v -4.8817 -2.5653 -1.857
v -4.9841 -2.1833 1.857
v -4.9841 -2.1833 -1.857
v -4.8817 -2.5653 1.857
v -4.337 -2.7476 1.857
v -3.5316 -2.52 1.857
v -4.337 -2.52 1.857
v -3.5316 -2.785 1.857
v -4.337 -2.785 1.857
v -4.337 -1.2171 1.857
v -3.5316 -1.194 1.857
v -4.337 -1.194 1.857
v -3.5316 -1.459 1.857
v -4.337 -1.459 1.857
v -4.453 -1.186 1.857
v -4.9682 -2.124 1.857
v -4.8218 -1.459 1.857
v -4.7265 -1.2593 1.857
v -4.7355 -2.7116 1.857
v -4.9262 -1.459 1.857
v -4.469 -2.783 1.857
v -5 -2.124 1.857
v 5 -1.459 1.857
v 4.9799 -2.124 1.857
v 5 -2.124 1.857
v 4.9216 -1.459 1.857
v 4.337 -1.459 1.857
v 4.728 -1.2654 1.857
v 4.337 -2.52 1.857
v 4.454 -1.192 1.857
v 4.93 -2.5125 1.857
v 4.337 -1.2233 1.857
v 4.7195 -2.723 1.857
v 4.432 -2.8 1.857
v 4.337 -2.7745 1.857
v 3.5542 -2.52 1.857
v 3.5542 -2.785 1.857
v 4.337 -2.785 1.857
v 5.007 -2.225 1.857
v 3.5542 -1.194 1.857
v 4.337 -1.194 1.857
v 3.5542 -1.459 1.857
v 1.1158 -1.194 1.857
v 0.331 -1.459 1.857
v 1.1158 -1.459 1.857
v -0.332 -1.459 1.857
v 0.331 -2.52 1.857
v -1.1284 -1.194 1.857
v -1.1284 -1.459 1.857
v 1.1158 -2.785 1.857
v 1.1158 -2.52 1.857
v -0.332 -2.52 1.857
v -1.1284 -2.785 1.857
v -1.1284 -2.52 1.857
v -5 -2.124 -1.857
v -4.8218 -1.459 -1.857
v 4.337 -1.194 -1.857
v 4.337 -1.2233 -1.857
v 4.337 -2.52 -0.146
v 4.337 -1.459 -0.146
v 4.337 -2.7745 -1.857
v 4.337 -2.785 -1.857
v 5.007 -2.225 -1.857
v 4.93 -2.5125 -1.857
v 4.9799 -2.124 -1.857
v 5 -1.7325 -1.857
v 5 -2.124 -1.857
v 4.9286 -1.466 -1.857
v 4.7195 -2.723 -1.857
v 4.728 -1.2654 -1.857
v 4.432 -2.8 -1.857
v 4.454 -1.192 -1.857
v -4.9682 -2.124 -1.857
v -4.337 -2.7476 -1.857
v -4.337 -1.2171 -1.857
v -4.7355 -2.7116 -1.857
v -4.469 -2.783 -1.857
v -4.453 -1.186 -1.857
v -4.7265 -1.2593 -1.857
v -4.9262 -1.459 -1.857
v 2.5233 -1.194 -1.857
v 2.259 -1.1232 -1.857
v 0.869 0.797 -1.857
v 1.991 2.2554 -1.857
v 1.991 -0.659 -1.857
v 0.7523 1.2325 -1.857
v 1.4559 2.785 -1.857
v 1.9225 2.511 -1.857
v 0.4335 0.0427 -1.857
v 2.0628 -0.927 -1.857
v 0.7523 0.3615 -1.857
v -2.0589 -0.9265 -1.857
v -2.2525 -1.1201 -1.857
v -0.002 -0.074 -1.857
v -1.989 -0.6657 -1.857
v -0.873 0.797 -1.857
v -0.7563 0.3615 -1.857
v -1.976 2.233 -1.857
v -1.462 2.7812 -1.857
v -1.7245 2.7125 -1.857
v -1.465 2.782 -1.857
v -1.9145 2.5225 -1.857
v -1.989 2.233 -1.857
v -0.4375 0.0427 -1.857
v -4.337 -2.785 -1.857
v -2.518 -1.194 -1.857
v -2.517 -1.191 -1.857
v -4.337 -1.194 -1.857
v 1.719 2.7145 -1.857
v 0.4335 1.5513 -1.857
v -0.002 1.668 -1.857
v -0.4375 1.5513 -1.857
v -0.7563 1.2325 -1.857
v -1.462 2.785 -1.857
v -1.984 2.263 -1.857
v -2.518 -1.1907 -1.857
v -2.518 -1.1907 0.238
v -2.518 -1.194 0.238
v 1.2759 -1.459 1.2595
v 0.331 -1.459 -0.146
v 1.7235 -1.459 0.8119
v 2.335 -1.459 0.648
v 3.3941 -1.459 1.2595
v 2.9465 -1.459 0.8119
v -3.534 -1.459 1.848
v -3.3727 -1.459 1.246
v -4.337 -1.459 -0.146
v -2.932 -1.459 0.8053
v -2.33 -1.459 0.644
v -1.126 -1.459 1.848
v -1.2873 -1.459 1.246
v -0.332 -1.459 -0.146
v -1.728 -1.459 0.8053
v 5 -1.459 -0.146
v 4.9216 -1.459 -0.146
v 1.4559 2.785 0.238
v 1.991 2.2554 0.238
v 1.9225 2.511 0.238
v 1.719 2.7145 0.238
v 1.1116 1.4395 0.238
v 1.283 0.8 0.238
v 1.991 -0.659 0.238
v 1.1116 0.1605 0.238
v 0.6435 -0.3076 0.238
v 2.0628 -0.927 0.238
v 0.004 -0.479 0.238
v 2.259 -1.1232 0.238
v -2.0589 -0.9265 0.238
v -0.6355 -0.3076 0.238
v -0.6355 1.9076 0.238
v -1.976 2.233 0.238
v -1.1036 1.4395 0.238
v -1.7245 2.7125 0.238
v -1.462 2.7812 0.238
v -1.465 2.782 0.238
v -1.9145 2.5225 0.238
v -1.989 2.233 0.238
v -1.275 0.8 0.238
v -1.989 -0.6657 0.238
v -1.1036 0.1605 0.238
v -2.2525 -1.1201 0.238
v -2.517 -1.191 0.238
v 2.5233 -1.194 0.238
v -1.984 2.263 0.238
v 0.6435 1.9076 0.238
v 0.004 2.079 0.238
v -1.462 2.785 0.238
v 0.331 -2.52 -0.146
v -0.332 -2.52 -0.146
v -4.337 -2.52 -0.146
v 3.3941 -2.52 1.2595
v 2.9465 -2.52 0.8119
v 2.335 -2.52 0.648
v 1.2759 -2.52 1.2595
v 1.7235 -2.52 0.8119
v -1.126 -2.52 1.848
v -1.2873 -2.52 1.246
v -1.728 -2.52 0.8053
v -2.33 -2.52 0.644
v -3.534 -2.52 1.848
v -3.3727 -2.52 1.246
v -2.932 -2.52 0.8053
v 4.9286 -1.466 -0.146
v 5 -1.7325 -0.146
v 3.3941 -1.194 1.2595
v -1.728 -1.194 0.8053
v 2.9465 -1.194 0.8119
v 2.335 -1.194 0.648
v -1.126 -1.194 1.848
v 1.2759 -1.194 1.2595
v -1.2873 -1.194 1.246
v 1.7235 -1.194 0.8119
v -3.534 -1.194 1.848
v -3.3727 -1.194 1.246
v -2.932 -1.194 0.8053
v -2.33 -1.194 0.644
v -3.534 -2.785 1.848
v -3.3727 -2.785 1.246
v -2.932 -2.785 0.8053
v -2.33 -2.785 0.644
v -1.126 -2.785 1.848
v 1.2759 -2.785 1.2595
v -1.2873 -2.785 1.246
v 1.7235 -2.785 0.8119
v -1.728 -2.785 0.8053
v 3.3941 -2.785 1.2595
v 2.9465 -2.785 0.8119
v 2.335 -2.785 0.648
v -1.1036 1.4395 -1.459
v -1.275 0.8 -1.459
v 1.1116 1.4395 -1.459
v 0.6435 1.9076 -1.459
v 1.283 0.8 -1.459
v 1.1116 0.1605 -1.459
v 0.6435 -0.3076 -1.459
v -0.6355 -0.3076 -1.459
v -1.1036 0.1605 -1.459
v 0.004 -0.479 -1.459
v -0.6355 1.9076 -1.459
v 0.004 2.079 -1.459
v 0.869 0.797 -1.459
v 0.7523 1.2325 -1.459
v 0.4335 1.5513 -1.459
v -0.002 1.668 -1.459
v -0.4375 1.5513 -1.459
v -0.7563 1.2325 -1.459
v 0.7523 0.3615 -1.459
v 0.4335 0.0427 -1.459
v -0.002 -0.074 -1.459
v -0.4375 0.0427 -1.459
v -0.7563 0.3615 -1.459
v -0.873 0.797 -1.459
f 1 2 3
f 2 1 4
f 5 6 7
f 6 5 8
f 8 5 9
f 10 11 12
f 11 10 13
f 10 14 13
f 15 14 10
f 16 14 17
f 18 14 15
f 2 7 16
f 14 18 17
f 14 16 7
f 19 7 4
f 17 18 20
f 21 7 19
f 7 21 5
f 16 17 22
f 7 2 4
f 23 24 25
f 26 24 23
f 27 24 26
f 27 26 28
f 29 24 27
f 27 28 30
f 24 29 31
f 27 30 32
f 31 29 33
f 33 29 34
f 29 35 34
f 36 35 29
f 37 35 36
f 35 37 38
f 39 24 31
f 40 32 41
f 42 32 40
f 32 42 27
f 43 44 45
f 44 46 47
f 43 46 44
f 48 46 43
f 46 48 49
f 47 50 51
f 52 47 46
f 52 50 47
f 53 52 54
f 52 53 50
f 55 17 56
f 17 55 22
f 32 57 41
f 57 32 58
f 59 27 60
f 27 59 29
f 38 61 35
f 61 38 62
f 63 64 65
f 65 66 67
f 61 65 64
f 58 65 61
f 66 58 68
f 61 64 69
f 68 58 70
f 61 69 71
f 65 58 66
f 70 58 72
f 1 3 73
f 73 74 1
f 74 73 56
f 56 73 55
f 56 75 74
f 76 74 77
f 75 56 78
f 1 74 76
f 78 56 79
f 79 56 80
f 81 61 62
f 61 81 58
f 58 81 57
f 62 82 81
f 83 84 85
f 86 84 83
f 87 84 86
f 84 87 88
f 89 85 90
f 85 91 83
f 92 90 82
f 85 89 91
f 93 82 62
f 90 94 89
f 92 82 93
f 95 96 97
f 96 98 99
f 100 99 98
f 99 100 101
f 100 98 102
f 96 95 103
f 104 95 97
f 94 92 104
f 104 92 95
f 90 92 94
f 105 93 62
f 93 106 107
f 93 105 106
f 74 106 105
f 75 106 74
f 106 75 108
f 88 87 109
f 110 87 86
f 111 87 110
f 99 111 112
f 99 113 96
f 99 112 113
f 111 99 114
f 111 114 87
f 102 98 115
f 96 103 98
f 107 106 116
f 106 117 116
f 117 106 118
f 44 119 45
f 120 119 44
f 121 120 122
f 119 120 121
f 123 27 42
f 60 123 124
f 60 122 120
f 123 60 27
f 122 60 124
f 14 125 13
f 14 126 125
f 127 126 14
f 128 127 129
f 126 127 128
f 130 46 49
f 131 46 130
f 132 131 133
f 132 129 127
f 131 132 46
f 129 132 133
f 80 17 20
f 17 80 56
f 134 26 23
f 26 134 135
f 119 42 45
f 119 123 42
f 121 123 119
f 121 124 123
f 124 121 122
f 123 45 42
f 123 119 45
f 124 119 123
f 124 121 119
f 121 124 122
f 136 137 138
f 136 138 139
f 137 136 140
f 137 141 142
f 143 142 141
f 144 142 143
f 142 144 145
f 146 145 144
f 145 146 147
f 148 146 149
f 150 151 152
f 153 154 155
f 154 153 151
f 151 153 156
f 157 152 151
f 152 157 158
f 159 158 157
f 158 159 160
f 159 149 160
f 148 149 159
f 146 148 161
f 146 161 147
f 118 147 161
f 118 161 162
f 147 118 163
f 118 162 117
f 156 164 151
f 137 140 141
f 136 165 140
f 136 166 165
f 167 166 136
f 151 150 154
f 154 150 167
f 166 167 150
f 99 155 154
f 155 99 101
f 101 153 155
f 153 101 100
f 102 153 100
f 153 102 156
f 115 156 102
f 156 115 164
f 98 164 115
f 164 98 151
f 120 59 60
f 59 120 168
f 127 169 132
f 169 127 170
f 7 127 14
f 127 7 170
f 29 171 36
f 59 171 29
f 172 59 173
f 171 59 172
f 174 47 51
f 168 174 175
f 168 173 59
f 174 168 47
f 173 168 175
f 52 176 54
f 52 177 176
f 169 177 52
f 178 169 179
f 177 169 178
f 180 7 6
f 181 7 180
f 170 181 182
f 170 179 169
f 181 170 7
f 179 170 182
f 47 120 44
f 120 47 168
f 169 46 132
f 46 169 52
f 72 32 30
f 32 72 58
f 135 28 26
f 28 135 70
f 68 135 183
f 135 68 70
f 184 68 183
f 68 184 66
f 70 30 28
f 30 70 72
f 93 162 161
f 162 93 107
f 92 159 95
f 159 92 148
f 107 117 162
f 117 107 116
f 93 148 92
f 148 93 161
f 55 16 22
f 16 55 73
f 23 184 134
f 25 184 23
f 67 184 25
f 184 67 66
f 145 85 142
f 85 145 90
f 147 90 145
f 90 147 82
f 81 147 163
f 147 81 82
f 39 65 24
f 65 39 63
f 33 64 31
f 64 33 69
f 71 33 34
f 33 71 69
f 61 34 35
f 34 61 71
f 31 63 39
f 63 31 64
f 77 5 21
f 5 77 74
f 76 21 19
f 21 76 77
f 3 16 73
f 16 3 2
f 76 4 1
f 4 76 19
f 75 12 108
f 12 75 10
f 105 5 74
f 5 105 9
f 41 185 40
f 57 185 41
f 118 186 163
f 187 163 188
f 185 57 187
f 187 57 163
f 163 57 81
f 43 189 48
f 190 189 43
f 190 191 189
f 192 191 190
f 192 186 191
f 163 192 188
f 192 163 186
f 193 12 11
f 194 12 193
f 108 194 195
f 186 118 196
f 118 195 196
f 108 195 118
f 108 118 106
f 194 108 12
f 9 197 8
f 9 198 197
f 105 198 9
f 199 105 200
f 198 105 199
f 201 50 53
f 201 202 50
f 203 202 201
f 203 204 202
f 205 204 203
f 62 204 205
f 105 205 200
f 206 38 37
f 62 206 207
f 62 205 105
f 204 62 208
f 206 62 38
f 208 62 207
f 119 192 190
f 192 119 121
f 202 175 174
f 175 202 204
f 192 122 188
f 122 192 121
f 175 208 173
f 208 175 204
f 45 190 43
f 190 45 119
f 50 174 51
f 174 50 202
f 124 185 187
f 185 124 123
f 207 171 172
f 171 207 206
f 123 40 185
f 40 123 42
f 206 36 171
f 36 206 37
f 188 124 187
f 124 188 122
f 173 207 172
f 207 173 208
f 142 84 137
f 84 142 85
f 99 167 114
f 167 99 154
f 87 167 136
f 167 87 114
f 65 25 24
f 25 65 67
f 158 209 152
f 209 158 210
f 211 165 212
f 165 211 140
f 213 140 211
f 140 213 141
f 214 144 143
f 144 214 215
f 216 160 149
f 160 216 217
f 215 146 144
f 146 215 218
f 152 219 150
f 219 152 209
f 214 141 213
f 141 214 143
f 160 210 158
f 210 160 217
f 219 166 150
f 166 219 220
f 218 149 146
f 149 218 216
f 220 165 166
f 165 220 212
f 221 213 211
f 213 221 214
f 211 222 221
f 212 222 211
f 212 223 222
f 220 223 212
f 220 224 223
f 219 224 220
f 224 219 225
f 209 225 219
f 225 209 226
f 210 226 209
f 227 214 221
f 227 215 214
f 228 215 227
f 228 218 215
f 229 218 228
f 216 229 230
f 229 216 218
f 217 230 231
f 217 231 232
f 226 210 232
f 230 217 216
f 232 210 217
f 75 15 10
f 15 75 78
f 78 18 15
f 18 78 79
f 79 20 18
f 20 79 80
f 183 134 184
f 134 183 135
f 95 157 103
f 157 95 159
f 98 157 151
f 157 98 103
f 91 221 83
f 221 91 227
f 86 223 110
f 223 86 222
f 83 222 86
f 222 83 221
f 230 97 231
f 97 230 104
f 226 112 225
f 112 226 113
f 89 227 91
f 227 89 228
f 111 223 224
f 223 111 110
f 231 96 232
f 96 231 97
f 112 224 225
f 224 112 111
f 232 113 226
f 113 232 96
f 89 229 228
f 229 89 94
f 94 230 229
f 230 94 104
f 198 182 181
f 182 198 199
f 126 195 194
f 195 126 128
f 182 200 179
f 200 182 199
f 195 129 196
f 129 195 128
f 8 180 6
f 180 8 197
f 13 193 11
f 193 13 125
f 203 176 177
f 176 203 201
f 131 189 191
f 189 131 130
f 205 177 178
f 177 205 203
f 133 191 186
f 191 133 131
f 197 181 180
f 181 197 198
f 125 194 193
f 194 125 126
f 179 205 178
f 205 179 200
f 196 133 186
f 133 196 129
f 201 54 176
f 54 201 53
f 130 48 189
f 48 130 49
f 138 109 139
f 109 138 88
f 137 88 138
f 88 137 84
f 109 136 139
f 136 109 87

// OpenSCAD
intersection() {
translate([-6, -3.342, -2.228]) cube(size = [12, 6.684, 4.456], center = false);
union() {
intersection() {
difference() {
    union() {
        rotate([0, 0, 0])
        translate([-2.518, -1.74, -1.857])
            cube(size = [5.044, 1.081, 2.095], center = false);
        translate([-1.465, 2.263, -1.857])
        cylinder(h = 2.095, r1 = 0.519, r2 = 0.519, center = false, $fn = 12);
        difference() {
            translate([2.954, -2.124, -18.1])
            cylinder(h = 19.957, r1 = 7.954, r2 = 7.954, center = false, $fn = 12);
            rotate([0, 0, 0])
            translate([-2.518, -1.459, -1.857]) cube(size = [6.855, 4.244, 3.714], center = false);
        }
    }
    union() {
        difference() {
        rotate([0, 0, 0])
            translate([-4.337, -2.52, -0.146])
                cube(size = [8.674, 1.061, 18.246], center = false);
            rotate([0, 0, 0])
            translate([-0.332, -2.52, -1.459])
                cube(size = [0.663, 1.861, 19.559], center = false);
        }
        difference() {
            rotate([0, 0, 0])
            translate([4.337, -1.74, -18.1])
                cube(size = [13.763, 4.525, 19.957], center = false);
            translate([4.454, -1.74, -1.857])
            cylinder(h = 3.714, r1 = 0.548, r2 = 0.548, center = false, $fn = 12);
        }
    }
}
union() {
translate([4.432, -2.225, -1.857])
cylinder(h = 3.714, r1 = 0.575, r2 = 0.575, center = false, $fn = 12);
difference() {
union() {
rotate([0, 0, 0])
translate([-2.518, -2.52, -1.857]) cube(size = [4.508, 5.305, 2.095], center = false);
rotate([0, 0, 0])
translate([-18.1, -2.52, -1.857]) cube(size = [22.437, 1.061, 3.714], center = false);
}
union() {
translate([-2.517, -0.662, -1.857])
cylinder(h = 2.095, r1 = 0.529, r2 = 0.529, center = false, $fn = 12);
rotate([0, 0, 0])
translate([-18.1, -2.52, -18.1]) cube(size = [13.763, 0.396, 19.957], center = false);
}
}
translate([-4.469, -2.25, -1.857])
cylinder(h = 3.714, r1 = 0.533, r2 = 0.533, center = false, $fn = 12);
difference() {
rotate([0, 0, 0])
translate([1.99, -1.74, -1.857]) cube(size = [3.01, 1.081, 3.714], center = false);
translate([2.527, -0.659, -1.857])
cylinder(h = 19.957, r1 = 0.536, r2 = 0.536, center = false, $fn = 12);
}
}
}
difference() {
union() {
difference() {
rotate([0, 0, 0])
translate([-4.337, -2.785, -1.857]) cube(size = [8.674, 1.591, 3.714], center = false);
rotate([180, 90, -90])
translate([-1.871, -2.335, -18.1])
cylinder(h = 36.2, r1 = 1.223, r2 = 1.223, center = false, $fn = 12);
}
rotate([0, 0, 0])
translate([-0.332, -2.124, -1.857]) cube(size = [5.332, 0.384, 2.095], center = false);
difference() {
rotate([0, 0, 0])
translate([-1.462, -2.124, -1.857]) cube(size = [3.453, 4.909, 2.095], center = false);
translate([0.004, 0.8, -1.459])
cylinder(h = 19.559, r1 = 1.279, r2 = 1.279, center = false, $fn = 12);
}
translate([-4.453, -1.733, -1.857])
cylinder(h = 3.714, r1 = 0.547, r2 = 0.547, center = false, $fn = 12);
rotate([0, 0, 0])
translate([-4.337, -2.124, -0.146]) cube(size = [9.337, 0.665, 2.003], center = false);
rotate([0, 0, 0])
translate([-1.989, -1.74, -1.857]) cube(size = [0.527, 3.973, 2.095], center = false);
}
union() {
difference() {
rotate([0, 0, 0])
translate([-18.1, -2.52, -1.857]) cube(size = [22.437, 4.753, 3.714], center = false);
difference() {
rotate([0, 0, 0])
translate([-18.1, -1.459, -1.857]) cube(size = [22.437, 3.692, 3.714], center = false);
translate([-0.002, 0.797, -1.857])
cylinder(h = 19.957, r1 = 0.871, r2 = 0.871, center = false, $fn = 12);
}
}
difference() {
union() {
rotate([0, 0, 0])
translate([1.443, 2.233, -18.1]) cube(size = [16.657, 15.867, 36.2], center = false);
rotate([180, 90, -90])
translate([-1.848, 2.33, -2.785])
cylinder(h = 5.57, r1 = 1.204, r2 = 1.204, center = false, $fn = 12);
}
translate([1.441, 2.233, -18.1])
cylinder(h = 18.339, r1 = 0.556, r2 = 0.556, center = false, $fn = 12);
}
}
}
}
}
